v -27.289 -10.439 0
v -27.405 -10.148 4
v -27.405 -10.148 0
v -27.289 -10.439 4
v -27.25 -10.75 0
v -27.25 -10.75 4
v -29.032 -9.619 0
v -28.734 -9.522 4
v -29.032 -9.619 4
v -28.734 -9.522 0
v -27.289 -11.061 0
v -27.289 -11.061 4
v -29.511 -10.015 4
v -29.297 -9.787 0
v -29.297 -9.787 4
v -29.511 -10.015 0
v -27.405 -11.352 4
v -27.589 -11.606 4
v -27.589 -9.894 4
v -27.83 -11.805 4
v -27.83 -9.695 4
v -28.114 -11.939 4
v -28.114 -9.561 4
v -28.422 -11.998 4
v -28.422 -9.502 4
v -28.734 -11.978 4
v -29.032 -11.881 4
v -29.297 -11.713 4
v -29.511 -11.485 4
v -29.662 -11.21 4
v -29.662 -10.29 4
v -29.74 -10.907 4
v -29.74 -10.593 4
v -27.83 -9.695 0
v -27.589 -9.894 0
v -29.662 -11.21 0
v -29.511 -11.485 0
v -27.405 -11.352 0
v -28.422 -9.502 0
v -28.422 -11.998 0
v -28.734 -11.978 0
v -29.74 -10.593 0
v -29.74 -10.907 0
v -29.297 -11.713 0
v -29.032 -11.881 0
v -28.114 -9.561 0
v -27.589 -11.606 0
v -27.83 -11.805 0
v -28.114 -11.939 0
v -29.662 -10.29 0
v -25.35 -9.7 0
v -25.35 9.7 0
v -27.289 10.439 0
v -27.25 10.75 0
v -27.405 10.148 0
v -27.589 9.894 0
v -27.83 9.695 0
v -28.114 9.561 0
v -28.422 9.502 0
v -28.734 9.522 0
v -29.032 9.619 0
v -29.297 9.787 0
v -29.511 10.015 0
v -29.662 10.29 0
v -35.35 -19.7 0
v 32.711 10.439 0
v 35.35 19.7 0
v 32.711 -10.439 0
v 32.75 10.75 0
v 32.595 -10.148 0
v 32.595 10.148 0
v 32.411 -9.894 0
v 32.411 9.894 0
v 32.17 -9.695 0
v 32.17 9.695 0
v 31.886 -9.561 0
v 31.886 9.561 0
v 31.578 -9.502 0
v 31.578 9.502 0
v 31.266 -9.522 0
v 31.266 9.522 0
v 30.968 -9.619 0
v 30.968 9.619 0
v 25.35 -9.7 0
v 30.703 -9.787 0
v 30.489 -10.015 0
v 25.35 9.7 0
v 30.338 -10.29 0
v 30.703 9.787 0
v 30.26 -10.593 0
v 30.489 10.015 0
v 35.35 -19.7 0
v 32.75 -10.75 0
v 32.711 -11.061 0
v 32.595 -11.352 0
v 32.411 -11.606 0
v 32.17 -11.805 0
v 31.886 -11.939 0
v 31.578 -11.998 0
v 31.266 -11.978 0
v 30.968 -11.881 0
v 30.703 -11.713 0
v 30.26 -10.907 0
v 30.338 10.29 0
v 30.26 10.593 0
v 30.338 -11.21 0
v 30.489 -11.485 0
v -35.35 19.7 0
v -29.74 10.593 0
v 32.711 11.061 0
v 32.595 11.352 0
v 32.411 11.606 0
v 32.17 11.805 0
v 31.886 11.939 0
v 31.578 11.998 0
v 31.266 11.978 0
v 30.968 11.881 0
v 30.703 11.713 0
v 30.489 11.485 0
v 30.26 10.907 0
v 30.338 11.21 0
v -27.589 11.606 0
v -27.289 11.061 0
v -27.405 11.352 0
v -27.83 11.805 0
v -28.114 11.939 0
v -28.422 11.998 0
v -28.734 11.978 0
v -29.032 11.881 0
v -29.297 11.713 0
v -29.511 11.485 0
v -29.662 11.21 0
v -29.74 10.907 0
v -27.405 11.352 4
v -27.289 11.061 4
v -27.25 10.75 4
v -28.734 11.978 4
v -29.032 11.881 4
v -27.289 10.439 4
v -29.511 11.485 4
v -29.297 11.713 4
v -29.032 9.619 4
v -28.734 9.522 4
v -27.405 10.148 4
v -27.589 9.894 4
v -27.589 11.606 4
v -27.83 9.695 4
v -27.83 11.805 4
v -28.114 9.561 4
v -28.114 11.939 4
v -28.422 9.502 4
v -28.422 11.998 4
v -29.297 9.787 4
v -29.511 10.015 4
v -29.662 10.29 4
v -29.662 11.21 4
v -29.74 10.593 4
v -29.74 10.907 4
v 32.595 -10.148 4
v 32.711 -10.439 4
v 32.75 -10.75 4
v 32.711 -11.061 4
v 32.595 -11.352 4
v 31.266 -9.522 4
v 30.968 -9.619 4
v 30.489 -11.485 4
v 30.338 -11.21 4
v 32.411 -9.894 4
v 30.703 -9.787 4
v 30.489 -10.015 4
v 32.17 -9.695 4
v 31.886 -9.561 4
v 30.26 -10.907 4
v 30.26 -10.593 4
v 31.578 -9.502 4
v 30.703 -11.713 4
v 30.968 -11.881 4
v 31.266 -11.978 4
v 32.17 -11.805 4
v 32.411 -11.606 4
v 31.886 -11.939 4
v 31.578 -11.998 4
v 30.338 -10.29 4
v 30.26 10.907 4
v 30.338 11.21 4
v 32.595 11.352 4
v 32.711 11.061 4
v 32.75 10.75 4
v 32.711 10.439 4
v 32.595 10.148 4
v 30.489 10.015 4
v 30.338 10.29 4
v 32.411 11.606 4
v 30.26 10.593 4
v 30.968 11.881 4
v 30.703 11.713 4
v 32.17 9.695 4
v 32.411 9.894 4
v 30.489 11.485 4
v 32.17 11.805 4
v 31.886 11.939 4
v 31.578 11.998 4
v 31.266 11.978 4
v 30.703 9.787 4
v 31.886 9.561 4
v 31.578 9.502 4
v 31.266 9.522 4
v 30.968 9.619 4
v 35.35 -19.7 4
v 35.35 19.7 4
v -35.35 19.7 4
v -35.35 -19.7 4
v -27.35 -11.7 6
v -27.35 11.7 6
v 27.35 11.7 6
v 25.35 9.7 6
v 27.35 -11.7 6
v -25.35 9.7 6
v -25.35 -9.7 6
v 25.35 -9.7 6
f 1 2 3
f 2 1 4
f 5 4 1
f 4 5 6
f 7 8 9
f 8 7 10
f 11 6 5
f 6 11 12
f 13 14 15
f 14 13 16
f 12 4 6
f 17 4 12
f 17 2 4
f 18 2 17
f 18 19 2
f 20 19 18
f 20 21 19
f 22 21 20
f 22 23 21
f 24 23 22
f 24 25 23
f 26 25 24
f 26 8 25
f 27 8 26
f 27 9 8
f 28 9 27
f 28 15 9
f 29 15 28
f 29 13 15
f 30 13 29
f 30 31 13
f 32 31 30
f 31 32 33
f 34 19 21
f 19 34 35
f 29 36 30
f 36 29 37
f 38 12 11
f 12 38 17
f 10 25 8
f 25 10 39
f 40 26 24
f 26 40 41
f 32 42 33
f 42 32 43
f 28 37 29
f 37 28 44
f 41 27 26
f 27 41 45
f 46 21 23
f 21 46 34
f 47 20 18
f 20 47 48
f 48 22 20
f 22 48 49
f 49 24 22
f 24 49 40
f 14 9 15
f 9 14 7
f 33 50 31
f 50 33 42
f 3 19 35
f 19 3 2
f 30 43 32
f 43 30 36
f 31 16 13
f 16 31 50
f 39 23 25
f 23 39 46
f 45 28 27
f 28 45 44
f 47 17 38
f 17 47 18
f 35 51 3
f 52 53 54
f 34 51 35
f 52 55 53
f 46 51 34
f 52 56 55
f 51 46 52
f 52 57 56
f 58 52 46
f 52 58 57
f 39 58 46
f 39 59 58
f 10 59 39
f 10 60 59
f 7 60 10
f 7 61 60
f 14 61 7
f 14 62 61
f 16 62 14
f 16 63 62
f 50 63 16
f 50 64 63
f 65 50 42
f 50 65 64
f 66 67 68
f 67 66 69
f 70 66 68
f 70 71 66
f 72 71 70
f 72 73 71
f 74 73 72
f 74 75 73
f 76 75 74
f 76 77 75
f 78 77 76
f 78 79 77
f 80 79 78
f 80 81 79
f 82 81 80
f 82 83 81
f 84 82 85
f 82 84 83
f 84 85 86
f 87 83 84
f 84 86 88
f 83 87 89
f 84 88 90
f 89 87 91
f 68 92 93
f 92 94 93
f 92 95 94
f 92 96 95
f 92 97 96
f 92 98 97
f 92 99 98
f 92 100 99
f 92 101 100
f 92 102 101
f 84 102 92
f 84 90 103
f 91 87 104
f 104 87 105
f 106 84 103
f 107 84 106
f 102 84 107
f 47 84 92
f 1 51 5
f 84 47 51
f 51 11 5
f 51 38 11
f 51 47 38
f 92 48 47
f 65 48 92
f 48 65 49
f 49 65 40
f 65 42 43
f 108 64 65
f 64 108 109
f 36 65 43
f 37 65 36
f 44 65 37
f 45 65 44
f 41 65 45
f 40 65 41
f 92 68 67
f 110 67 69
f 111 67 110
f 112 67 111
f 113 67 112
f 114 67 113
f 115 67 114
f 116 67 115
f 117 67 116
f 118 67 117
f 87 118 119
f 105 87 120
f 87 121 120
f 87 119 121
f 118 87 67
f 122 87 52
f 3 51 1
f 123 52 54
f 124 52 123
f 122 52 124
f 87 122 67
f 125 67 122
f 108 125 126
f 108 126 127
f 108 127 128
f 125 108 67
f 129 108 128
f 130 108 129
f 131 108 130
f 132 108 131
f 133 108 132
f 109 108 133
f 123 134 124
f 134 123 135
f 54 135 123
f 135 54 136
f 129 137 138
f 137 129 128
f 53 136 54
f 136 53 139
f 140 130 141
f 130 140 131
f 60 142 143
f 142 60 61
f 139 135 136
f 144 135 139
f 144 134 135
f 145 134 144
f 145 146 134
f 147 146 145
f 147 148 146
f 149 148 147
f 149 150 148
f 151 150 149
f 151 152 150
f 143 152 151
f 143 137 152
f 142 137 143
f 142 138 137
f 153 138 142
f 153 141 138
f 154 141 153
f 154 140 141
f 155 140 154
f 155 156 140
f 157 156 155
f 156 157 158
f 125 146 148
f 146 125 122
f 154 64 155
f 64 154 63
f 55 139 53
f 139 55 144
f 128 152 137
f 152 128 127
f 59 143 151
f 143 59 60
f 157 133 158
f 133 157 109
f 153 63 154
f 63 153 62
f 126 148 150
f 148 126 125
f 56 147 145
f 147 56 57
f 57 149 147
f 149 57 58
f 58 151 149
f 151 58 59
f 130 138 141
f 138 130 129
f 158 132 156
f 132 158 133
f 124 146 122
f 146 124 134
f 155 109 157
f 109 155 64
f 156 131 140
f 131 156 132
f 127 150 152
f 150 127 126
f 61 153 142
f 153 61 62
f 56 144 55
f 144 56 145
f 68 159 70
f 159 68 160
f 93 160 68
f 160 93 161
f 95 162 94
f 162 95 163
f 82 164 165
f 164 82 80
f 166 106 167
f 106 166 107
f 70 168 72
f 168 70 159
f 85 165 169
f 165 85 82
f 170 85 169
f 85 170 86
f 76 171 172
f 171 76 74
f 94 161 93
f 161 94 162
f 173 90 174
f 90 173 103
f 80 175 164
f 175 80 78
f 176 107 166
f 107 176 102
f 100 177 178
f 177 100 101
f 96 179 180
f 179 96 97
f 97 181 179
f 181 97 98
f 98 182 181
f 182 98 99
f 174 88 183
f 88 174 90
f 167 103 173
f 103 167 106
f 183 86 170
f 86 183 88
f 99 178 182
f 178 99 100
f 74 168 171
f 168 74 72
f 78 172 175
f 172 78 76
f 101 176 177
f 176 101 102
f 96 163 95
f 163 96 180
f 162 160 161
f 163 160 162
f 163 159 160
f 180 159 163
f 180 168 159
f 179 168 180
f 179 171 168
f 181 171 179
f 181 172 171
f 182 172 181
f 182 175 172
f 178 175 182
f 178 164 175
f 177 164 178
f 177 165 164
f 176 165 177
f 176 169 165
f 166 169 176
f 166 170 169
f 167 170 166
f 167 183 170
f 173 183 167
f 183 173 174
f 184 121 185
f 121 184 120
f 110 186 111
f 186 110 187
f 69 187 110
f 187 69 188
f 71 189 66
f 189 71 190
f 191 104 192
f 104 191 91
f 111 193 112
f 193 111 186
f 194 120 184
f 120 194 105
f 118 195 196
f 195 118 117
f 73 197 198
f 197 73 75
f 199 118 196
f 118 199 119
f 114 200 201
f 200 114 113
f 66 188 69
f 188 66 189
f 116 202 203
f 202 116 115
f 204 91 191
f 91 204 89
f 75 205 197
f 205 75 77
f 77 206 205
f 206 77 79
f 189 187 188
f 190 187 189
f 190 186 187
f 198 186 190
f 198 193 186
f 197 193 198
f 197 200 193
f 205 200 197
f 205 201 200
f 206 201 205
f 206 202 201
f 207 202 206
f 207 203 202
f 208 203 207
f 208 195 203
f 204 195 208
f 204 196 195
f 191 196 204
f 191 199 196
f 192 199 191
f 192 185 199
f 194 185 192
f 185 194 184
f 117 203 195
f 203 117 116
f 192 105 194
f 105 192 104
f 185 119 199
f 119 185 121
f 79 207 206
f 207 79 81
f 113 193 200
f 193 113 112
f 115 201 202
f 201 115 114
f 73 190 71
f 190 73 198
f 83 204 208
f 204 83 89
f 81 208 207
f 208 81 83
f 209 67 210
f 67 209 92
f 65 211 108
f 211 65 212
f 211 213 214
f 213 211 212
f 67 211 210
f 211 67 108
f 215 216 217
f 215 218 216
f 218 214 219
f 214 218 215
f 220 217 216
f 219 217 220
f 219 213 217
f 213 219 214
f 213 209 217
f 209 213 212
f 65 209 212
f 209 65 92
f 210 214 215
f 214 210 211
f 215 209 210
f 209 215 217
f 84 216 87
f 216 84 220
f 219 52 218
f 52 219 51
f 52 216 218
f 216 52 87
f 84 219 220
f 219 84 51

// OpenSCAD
displayLength = 50.7;
displayHeight = 19.4;
displayDepth = 8.0;

boardLength = 66.7;
boardHeight = 27.3;

bezelWidth = 10.0;
bezelRevealDepth = 1.0;
bezelFlatWidth = 2.0;
bezelFlatDepth = 4.0;

screwRadius = 2.5 / 2;
screwLength = 4.0;
screwLengthSeparation = 60.0;
screwHeightSeparation = 21.5;
screwLengthOffset = 1.5;
screwHeightOffset = 0.0;

mountThickness = 3.0;


bezelLength = displayLength + bezelWidth * 2;
bezelHeight = displayHeight + bezelWidth * 2;
bezelTopLength = bezelLength - 2 * (bezelWidth - bezelFlatWidth);
bezelTopHeight = bezelHeight - 2 * (bezelWidth - bezelFlatWidth);
bezelDepth = displayDepth + bezelRevealDepth - mountThickness;


difference() {
  // Main bezel body
  hull() {
    translate([-bezelLength / 2, -bezelHeight / 2, 0]) {
      cube([bezelLength, bezelHeight, bezelFlatDepth]);
    }
    translate([-bezelTopLength / 2, -bezelTopHeight / 2, 0]) {
      cube([bezelTopLength, bezelTopHeight, bezelDepth]);
    }
  }
  
  // Display cutout
  translate([-displayLength / 2, -displayHeight / 2, 0]) {
    cube([displayLength, displayHeight, bezelDepth]);
  }
  
  // Screw holes
  for (x = [-0.5, 0.5]) {
    for (y = [-0.5, 0.5]) {
      translate([screwLengthOffset + x * screwLengthSeparation, screwHeightOffset + y * screwHeightSeparation, 0]) {
        cylinder(screwLength, screwRadius, screwRadius, $fn = 25);
      }
    }
  }
}
